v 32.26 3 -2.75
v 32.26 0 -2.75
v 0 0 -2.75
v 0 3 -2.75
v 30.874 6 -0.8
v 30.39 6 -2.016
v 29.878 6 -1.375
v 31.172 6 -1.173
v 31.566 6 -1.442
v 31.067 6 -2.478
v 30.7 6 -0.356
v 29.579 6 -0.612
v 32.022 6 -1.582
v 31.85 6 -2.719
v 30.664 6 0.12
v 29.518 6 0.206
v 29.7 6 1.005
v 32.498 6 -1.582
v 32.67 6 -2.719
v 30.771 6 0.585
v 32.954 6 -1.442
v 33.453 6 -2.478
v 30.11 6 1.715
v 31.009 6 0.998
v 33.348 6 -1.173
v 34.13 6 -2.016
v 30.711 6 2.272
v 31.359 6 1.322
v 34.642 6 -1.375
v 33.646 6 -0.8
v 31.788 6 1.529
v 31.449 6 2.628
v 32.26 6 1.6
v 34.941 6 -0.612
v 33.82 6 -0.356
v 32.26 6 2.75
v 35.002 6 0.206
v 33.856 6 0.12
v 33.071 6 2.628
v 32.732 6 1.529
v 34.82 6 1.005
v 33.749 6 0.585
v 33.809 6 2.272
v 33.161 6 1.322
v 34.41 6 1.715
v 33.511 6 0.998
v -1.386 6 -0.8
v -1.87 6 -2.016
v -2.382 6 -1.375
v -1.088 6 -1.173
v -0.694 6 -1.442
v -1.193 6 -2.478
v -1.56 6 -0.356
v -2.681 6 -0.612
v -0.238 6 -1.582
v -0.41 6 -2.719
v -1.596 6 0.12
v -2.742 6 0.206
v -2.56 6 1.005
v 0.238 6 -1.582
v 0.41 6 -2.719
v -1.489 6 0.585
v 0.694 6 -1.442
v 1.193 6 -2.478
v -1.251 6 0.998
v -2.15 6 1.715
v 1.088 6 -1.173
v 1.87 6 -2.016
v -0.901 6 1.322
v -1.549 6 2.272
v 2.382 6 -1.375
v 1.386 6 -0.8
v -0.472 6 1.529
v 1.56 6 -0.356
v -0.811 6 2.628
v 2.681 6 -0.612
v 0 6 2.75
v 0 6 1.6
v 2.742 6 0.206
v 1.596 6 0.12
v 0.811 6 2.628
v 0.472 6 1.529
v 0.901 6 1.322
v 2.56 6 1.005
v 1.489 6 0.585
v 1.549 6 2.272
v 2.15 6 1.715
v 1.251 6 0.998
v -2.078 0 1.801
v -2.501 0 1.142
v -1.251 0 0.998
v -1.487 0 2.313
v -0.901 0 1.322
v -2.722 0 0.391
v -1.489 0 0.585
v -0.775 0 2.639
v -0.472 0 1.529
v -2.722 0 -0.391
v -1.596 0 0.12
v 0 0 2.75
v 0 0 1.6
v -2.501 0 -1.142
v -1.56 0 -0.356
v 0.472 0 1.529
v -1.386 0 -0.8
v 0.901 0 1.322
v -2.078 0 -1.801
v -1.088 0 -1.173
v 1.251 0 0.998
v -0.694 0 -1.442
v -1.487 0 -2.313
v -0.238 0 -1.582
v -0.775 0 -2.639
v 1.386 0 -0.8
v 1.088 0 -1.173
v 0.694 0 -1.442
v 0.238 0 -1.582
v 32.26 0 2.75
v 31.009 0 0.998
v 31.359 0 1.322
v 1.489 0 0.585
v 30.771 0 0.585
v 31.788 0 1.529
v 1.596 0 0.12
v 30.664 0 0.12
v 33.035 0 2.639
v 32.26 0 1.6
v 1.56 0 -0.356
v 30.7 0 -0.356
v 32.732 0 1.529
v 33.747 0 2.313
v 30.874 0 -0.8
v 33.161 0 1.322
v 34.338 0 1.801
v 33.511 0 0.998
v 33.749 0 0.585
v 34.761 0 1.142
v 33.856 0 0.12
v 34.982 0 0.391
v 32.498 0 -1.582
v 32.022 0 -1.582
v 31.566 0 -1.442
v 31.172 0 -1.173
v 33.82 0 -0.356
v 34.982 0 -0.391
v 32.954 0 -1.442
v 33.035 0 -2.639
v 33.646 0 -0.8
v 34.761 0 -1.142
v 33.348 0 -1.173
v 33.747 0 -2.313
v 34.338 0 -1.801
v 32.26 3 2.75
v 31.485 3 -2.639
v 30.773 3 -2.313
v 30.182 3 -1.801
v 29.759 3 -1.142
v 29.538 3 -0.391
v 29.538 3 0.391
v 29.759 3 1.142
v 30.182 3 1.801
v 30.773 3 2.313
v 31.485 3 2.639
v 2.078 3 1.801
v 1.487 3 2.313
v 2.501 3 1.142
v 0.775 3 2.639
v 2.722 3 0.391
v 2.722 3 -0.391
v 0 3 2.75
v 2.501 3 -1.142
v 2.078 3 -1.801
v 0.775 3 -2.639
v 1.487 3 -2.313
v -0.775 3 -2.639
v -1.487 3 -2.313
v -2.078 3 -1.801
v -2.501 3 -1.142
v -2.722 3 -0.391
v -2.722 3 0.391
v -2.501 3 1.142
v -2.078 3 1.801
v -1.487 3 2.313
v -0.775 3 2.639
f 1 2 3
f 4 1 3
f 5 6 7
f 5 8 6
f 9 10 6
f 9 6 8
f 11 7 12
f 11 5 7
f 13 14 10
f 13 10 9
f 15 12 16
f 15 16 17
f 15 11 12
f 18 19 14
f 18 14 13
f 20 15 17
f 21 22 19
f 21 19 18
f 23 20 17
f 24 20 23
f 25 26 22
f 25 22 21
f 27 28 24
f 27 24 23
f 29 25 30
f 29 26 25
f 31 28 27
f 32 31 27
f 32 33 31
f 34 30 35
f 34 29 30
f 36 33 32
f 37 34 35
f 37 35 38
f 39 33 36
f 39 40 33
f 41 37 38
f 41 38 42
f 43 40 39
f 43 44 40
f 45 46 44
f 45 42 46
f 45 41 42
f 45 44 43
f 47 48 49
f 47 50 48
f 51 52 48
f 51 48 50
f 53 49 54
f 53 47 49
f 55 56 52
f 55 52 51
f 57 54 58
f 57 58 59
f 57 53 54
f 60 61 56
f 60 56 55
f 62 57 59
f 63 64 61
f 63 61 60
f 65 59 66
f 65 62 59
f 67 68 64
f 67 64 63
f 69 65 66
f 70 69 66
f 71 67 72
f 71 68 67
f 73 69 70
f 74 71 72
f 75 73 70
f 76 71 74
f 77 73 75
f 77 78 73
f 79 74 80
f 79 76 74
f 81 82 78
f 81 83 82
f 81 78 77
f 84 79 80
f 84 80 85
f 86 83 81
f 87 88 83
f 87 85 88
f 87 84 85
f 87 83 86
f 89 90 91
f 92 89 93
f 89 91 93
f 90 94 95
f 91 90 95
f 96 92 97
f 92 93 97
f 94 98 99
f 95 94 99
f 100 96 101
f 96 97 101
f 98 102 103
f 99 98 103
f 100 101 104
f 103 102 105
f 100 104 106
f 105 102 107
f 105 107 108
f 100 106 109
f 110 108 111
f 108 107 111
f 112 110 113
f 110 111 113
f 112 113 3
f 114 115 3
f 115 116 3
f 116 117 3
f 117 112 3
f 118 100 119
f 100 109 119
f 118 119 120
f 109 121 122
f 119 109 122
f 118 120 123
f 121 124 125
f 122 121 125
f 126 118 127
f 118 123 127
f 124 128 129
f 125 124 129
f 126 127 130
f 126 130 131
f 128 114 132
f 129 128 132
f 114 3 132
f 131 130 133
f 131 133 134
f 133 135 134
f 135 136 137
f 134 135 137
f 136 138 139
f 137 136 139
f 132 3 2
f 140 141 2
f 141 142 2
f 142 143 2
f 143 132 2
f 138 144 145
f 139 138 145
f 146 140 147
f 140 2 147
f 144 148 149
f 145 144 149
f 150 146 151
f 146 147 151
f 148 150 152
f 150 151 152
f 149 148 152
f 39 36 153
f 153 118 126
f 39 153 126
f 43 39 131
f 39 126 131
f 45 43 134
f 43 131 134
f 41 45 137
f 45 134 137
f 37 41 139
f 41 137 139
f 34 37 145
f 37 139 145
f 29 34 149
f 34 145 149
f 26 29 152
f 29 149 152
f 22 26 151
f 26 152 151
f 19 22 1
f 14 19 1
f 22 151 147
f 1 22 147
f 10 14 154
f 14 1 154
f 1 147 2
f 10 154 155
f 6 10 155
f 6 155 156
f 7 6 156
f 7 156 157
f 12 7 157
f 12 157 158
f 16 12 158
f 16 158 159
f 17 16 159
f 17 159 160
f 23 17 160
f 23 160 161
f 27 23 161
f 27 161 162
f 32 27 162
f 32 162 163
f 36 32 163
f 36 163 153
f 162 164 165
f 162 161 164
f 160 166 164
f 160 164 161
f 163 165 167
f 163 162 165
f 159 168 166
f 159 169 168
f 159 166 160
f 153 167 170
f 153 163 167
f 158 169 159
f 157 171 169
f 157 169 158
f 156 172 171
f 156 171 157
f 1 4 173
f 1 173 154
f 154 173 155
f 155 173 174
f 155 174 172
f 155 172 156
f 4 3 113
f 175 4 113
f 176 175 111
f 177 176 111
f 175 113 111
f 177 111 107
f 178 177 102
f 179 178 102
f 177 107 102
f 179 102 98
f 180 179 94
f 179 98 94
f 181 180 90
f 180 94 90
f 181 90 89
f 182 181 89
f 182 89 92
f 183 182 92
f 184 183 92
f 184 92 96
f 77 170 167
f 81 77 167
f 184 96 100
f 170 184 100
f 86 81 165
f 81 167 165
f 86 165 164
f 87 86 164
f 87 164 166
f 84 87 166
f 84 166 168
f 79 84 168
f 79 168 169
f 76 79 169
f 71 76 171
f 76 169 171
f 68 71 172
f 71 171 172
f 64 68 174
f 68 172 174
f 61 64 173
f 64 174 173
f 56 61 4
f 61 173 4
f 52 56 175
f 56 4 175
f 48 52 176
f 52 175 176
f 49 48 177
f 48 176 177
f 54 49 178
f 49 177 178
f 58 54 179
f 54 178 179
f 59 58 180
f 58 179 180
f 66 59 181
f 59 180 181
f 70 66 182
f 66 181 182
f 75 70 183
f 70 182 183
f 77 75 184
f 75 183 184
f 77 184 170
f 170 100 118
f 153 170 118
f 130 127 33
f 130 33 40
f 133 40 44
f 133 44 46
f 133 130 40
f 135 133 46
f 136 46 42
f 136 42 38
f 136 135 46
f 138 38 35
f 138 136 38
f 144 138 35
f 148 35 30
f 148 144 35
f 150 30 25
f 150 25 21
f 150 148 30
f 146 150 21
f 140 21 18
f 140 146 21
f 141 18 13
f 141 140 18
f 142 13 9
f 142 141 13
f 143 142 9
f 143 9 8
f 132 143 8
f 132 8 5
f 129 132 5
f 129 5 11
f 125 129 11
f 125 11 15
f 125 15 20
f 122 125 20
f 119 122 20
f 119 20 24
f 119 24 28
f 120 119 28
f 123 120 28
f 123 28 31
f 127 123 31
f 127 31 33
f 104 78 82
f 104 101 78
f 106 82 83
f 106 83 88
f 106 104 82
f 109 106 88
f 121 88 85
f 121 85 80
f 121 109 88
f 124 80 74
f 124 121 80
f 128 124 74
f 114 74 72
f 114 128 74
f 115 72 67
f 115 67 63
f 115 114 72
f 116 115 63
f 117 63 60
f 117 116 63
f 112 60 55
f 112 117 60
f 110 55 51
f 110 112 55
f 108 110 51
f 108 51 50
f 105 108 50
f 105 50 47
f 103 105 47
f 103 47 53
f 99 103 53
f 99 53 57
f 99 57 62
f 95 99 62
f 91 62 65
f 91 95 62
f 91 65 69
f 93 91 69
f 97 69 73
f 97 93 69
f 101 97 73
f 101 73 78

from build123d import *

# Parameters (mm, degrees)
CROQUIS1_R              = 1.6
SALIENTE_EXTRUIR1_DEPTH = 3
CROQUIS2_R              = 2.75
CROQUIS2_R_2            = 1.6
SALIENTE_EXTRUIR2_DEPTH = 3


with BuildPart() as part:
    # Croquis1 → Saliente-Extruir1 (new body)
    with BuildSketch(Plane(origin=(0, 0, 0), x_dir=(1, 0, 0), z_dir=(0, 1, 0))):
        with BuildLine():
            ThreePointArc((0, 2.75), (-2.75, 0), (0, -2.75))
            Line((0, -2.75), (32.26, -2.75))
            ThreePointArc((32.26, -2.75), (35.01, 0), (32.26, 2.75))
            Line((32.26, 2.75), (0, 2.75))
        make_face()
        with Locations(Location((0, 0, 0), (0, 0, 270))):
            Circle(CROQUIS1_R, mode=Mode.SUBTRACT)
        with Locations(Location((32.26, 0, 0), (0, 0, 270))):
            Circle(CROQUIS1_R, mode=Mode.SUBTRACT)
    extrude(amount=SALIENTE_EXTRUIR1_DEPTH)

    # Croquis2 → Saliente-Extruir2 (add)
    # profile 1 of 2: a face of its own
    with BuildSketch(Plane(origin=(0, 3, 0), x_dir=(1, 0, 0), z_dir=(0, 1, 0))):
        with Locations(Location((0, 0, 0), (0, 0, 270))):
            Circle(CROQUIS2_R)
        with Locations(Location((0, 0, 0), (0, 0, 270))):
            Circle(CROQUIS2_R_2, mode=Mode.SUBTRACT)
    # profile 2 of 2: a face of its own
    with BuildSketch(Plane(origin=(0, 3, 0), x_dir=(1, 0, 0), z_dir=(0, 1, 0))):
        with Locations(Location((32.26, 0, 0), (0, 0, 270))):
            Circle(CROQUIS2_R)
        with Locations(Location((32.26, 0, 0), (0, 0, 270))):
            Circle(CROQUIS2_R_2, mode=Mode.SUBTRACT)
    extrude(amount=SALIENTE_EXTRUIR2_DEPTH)


solid = part.part
